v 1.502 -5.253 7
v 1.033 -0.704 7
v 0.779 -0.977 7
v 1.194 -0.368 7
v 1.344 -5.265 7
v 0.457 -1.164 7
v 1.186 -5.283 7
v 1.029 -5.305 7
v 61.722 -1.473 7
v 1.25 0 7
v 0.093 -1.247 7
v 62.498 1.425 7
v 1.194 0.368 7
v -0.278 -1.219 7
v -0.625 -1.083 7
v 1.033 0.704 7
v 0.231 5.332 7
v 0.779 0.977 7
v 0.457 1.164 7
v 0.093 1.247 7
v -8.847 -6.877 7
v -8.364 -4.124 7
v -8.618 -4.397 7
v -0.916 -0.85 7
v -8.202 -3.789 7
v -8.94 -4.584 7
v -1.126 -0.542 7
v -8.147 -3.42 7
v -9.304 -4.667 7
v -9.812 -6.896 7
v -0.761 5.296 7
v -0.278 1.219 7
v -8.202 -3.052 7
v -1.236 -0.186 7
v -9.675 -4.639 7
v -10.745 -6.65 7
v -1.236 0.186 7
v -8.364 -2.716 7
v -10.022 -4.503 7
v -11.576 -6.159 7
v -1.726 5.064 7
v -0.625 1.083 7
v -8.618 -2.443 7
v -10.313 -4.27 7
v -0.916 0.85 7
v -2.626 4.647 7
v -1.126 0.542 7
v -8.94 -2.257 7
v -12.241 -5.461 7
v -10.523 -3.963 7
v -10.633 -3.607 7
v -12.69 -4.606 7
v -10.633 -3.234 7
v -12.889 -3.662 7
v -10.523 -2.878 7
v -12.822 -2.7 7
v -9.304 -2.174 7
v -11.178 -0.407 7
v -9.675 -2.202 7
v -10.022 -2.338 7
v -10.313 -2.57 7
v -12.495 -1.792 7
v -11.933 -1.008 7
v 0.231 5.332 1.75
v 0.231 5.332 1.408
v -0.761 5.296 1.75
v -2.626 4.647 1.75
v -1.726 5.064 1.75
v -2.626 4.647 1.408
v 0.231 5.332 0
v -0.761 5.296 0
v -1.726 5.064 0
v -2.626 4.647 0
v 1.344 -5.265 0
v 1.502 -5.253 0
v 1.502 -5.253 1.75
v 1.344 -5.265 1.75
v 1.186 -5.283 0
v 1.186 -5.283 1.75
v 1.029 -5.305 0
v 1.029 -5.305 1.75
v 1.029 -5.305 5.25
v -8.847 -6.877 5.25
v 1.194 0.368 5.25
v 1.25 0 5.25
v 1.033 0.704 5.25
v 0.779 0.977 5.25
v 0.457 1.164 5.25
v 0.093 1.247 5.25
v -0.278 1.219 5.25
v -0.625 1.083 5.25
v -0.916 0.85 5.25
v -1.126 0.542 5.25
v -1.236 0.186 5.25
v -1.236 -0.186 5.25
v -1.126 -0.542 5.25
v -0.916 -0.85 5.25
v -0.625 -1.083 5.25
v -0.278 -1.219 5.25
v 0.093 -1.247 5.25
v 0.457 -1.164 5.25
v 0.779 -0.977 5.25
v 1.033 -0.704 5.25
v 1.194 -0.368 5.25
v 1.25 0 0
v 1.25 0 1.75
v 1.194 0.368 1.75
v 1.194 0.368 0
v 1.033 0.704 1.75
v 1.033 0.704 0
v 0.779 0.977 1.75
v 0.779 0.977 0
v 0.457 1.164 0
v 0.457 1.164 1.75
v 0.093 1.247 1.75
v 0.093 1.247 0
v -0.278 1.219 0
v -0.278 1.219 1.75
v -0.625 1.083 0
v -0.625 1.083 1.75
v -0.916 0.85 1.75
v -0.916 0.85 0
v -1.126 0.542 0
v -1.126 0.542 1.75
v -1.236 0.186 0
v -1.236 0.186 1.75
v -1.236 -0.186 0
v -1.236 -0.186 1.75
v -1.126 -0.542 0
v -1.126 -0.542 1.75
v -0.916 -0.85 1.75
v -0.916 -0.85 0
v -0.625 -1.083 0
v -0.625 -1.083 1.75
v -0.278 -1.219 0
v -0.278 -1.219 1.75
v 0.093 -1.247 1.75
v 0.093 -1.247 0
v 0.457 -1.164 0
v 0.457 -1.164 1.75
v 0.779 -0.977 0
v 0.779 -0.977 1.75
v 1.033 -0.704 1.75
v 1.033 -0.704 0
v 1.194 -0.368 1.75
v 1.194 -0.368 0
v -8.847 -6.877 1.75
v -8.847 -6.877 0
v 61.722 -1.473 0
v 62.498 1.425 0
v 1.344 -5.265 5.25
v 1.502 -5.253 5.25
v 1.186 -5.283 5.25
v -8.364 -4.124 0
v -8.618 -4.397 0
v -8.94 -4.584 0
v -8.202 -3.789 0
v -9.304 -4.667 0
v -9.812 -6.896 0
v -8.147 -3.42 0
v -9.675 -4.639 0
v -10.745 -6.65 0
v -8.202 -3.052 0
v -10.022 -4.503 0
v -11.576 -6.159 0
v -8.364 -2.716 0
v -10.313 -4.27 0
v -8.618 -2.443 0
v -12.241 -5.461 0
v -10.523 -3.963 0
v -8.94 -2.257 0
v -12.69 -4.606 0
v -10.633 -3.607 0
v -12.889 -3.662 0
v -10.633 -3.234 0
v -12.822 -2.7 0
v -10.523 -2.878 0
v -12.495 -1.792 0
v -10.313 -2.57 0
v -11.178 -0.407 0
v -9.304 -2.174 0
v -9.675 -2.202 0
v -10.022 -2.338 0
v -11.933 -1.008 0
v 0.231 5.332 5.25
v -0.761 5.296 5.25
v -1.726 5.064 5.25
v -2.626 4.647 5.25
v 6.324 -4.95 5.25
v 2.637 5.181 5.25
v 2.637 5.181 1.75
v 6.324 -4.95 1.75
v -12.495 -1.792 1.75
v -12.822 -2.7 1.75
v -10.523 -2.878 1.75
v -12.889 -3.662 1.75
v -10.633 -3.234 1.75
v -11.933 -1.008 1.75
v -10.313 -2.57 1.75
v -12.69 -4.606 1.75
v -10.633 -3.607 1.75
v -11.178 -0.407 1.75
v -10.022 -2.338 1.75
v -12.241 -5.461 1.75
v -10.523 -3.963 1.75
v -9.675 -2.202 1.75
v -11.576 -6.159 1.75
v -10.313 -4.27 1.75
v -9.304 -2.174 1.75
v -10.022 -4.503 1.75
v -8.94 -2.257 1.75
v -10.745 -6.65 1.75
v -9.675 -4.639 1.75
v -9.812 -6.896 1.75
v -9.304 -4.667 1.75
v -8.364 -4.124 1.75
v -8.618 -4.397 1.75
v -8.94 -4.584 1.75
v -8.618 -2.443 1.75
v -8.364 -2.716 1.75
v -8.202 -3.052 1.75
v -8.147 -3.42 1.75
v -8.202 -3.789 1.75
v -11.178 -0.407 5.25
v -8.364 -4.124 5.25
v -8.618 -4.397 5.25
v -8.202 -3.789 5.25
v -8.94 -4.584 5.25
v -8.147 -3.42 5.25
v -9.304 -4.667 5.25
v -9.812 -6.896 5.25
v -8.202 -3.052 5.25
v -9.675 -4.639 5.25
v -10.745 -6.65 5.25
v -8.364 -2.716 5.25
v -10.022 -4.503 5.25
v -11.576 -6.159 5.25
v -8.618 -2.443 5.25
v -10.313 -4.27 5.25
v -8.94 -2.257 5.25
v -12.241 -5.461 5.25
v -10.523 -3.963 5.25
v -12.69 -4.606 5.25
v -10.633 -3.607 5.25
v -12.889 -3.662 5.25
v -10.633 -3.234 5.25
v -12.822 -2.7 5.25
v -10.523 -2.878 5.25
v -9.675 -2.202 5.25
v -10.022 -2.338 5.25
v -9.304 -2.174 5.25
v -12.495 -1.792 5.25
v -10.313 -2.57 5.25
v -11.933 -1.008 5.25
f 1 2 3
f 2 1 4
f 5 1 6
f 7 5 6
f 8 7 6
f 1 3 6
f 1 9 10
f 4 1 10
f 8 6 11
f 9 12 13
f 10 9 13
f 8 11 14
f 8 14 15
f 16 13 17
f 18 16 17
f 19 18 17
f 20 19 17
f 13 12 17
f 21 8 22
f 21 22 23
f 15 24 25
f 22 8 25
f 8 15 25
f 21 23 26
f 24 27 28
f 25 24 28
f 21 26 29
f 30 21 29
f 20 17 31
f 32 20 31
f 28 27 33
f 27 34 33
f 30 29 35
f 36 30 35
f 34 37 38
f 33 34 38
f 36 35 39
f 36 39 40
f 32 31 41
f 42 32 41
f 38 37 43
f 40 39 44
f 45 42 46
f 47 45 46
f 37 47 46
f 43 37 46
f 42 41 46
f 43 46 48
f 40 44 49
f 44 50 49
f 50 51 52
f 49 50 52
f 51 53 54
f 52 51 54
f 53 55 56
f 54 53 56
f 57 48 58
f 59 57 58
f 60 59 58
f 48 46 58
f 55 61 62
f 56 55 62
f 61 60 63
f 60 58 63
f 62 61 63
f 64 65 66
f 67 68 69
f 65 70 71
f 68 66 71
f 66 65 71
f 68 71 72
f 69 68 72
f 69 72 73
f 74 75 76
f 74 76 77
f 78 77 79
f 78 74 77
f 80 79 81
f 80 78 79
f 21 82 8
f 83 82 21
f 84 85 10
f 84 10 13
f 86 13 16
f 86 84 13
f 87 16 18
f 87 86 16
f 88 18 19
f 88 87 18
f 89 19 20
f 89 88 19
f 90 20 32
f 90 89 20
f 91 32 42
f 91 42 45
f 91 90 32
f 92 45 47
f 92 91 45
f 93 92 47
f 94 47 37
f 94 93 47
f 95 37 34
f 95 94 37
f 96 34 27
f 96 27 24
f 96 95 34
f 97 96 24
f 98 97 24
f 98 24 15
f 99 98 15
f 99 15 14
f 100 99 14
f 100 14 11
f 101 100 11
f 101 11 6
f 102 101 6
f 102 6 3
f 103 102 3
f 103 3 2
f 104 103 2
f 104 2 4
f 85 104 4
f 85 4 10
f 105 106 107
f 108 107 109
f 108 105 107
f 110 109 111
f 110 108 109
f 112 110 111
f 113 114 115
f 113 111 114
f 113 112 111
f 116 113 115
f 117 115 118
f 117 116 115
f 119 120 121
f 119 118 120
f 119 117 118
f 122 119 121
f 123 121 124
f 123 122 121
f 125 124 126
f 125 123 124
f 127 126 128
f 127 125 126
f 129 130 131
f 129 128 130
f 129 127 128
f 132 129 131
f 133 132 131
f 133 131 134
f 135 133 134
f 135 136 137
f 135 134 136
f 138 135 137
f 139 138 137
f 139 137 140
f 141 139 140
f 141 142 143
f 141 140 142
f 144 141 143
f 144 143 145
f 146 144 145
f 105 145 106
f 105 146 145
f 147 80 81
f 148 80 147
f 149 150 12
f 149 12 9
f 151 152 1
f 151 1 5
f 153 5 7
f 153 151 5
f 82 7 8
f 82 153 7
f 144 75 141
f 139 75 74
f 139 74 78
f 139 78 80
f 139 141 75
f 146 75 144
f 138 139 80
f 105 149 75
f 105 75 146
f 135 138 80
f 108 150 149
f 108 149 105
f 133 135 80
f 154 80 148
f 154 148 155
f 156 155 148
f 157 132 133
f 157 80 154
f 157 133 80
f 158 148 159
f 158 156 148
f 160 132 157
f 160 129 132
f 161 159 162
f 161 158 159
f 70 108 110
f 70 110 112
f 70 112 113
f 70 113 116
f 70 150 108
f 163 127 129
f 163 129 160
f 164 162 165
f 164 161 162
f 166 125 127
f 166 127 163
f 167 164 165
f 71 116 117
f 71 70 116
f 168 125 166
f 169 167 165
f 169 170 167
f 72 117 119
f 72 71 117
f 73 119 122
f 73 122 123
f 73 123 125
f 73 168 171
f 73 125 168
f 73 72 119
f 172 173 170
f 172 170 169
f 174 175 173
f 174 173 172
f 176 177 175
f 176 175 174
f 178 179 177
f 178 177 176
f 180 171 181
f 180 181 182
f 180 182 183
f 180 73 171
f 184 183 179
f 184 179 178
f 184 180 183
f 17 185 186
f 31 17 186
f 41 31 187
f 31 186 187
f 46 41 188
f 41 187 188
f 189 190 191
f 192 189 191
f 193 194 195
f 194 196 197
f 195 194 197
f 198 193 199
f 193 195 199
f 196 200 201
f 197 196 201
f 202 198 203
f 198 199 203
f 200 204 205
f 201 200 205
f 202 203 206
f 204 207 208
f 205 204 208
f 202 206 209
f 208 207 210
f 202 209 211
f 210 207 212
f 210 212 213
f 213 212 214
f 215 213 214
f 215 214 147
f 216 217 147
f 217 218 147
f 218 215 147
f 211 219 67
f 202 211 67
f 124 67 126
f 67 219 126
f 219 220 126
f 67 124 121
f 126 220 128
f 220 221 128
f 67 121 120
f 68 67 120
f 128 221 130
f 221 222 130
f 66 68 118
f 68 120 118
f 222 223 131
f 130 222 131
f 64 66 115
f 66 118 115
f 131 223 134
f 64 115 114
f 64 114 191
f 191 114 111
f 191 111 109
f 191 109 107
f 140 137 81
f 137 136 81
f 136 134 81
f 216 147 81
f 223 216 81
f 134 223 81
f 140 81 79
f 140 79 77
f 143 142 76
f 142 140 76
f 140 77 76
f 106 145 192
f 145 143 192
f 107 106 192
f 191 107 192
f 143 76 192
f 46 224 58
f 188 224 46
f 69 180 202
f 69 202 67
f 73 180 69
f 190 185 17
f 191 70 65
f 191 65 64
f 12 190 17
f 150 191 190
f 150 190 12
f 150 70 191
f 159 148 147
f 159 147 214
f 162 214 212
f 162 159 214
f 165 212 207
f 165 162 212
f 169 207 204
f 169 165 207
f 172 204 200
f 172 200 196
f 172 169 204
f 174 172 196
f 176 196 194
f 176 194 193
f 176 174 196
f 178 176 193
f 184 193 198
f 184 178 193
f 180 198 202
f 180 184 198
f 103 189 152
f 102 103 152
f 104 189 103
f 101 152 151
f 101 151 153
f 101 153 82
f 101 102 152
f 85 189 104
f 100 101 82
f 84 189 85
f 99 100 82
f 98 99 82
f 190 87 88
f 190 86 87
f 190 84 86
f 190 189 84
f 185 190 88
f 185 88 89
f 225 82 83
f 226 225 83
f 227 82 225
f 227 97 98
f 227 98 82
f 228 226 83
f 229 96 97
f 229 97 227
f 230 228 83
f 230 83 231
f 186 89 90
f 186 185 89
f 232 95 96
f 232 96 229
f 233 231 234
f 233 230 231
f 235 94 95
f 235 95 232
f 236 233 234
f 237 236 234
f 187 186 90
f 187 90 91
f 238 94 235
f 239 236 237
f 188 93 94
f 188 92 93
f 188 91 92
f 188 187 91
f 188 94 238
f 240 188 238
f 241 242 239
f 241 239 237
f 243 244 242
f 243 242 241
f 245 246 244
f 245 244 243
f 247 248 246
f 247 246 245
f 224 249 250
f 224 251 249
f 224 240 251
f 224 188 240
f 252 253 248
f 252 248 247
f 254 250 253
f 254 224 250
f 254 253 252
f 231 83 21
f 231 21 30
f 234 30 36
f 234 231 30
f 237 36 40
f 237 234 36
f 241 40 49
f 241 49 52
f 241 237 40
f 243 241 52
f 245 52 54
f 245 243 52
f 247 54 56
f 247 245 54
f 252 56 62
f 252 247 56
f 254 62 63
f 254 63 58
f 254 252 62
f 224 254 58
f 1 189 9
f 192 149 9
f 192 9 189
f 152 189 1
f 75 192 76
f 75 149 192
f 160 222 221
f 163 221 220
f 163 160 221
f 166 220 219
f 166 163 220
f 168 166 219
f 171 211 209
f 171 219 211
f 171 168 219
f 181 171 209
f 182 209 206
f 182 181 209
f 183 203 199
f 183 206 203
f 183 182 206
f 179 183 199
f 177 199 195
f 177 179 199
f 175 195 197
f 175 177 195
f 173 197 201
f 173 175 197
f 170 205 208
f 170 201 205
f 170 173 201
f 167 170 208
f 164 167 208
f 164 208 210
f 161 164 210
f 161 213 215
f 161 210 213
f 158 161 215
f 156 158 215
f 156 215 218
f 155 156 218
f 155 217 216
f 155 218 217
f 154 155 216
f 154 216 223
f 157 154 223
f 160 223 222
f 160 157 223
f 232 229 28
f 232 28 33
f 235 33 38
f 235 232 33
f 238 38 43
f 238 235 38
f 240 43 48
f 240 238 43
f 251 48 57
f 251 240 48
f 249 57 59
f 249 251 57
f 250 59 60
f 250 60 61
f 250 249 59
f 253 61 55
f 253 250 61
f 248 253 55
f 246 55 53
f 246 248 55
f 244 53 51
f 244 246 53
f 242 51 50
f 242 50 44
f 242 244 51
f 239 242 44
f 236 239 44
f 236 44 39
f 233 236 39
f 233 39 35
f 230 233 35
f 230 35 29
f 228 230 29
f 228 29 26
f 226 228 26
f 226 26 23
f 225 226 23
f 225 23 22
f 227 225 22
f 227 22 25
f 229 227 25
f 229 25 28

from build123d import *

# Parameters (mm, degrees)
SKETCH1_R               = 1.25
BOSS_EXTRUDE1_DEPTH     = 7
CUT_EXTRUDE1_DEPTH      = 63.812268863
CUT_EXTRUDE1_DEPTH_BACK = 63.812268863
SKETCH2_W               = 32.592394384
SKETCH2_H               = 3.5
FILLET1_R               = 5


with BuildPart() as part:
    # Sketch1 → Boss-Extrude1 (new body)
    with BuildSketch(Plane.XY):
        with BuildLine():
            Line((61.721813599, -1.473254022), (1.264188363, -5.267583503))
            Line((1.264188363, -5.267583503), (-8.846841125, -6.87670348))
            ThreePointArc((-8.846841125, -6.87670348), (-12.689755312, -4.606488283), (-11.177624454, -0.407044658))
            Line((-11.177624454, -0.407044658), (-1.302853294, 5.428691416))
            Line((-1.302853294, 5.428691416), (62.498270735, 1.424523457))
            Line((62.498270735, 1.424523457), (61.721813599, -1.473254022))
        make_face()
        Circle(SKETCH1_R, mode=Mode.SUBTRACT)
        with Locations((-9.396926208, -3.420201433)):
            Circle(SKETCH1_R, mode=Mode.SUBTRACT)
    extrude(amount=BOSS_EXTRUDE1_DEPTH)

    # Sketch2 → Cut-Extrude1 (cut, two sides: drawn at the far end of the back side and taken through both)
    with BuildSketch(Plane(origin=(0.427525179, -1.174615776, 0), x_dir=(0.9396926207859082, 0.3420201433256693, 0), z_dir=(-0.3420201433256693, 0.9396926207859082, 0)).offset(-CUT_EXTRUDE1_DEPTH_BACK)):
        with Locations((-12.046197192, -3.5)):
            Rectangle(SKETCH2_W, SKETCH2_H)
    extrude(amount=CUT_EXTRUDE1_DEPTH + CUT_EXTRUDE1_DEPTH_BACK, mode=Mode.SUBTRACT)

    # Fillet1
    # the kernel refuses this fillet: 5 mm, written as the material it adds along each edge
    with BuildSketch(Plane(origin=(1.264188363, -5.267583503, 5.25), x_dir=(0.9980363808193768, 0.06263691053172936, 0), z_dir=(0, 0, 1)), Plane(origin=(1.264188363, -5.267583503, 0), x_dir=(0.9980363808193768, 0.06263691053172936, 0), z_dir=(0, 0, 1))) as fillet1_piece_1:
        with BuildLine():
            CenterArc((FILLET1_R * 0.0476077036938, -FILLET1_R), FILLET1_R, 90, 5.45132501)
            Line((-FILLET1_R * 0.0473923866113, -FILLET1_R * 0.00452273615014), (0, 0))
            Line((0, 0), (FILLET1_R * 0.0476077036938, 0))
        make_face()
    extrude(amount=1.75)
    # the kernel refuses this fillet: 5 mm, written as the material it takes off along each edge
    with BuildSketch(Plane(origin=(-1.302853294, 5.428691416, 1.407700386), x_dir=(0.9980363808193763, -0.06263691053173732, 0), z_dir=(0, 0, 1))) as fillet1_2_piece_1:
        with BuildLine():
            CenterArc((FILLET1_R * 0.3073839691, -FILLET1_R), FILLET1_R, 90, 34.173177968)
            Line((-FILLET1_R * 0.254312163661, -FILLET1_R * 0.172656386716), (0, 0))
            Line((0, 0), (FILLET1_R * 0.3073839691, 0))
        make_face()
    extrude(amount=9.434599227, mode=Mode.SUBTRACT)
    with BuildSketch(Plane(origin=(-1.302853294, 5.428691416, -3.842299614), x_dir=(-0.8609019359097801, -0.5087709275762453, 0), z_dir=(0, 0, 1))) as fillet1_2_piece_2:
        with BuildLine():
            CenterArc((FILLET1_R * 0.3073839691, FILLET1_R), FILLET1_R, 235.826822032, 34.173177968)
            Line((-FILLET1_R * 0.254312163661, FILLET1_R * 0.172656386716), (0, 0))
            Line((0, 0), (FILLET1_R * 0.3073839691, 0))
        make_face()
    extrude(amount=9.434599227, mode=Mode.SUBTRACT)


solid = part.part
